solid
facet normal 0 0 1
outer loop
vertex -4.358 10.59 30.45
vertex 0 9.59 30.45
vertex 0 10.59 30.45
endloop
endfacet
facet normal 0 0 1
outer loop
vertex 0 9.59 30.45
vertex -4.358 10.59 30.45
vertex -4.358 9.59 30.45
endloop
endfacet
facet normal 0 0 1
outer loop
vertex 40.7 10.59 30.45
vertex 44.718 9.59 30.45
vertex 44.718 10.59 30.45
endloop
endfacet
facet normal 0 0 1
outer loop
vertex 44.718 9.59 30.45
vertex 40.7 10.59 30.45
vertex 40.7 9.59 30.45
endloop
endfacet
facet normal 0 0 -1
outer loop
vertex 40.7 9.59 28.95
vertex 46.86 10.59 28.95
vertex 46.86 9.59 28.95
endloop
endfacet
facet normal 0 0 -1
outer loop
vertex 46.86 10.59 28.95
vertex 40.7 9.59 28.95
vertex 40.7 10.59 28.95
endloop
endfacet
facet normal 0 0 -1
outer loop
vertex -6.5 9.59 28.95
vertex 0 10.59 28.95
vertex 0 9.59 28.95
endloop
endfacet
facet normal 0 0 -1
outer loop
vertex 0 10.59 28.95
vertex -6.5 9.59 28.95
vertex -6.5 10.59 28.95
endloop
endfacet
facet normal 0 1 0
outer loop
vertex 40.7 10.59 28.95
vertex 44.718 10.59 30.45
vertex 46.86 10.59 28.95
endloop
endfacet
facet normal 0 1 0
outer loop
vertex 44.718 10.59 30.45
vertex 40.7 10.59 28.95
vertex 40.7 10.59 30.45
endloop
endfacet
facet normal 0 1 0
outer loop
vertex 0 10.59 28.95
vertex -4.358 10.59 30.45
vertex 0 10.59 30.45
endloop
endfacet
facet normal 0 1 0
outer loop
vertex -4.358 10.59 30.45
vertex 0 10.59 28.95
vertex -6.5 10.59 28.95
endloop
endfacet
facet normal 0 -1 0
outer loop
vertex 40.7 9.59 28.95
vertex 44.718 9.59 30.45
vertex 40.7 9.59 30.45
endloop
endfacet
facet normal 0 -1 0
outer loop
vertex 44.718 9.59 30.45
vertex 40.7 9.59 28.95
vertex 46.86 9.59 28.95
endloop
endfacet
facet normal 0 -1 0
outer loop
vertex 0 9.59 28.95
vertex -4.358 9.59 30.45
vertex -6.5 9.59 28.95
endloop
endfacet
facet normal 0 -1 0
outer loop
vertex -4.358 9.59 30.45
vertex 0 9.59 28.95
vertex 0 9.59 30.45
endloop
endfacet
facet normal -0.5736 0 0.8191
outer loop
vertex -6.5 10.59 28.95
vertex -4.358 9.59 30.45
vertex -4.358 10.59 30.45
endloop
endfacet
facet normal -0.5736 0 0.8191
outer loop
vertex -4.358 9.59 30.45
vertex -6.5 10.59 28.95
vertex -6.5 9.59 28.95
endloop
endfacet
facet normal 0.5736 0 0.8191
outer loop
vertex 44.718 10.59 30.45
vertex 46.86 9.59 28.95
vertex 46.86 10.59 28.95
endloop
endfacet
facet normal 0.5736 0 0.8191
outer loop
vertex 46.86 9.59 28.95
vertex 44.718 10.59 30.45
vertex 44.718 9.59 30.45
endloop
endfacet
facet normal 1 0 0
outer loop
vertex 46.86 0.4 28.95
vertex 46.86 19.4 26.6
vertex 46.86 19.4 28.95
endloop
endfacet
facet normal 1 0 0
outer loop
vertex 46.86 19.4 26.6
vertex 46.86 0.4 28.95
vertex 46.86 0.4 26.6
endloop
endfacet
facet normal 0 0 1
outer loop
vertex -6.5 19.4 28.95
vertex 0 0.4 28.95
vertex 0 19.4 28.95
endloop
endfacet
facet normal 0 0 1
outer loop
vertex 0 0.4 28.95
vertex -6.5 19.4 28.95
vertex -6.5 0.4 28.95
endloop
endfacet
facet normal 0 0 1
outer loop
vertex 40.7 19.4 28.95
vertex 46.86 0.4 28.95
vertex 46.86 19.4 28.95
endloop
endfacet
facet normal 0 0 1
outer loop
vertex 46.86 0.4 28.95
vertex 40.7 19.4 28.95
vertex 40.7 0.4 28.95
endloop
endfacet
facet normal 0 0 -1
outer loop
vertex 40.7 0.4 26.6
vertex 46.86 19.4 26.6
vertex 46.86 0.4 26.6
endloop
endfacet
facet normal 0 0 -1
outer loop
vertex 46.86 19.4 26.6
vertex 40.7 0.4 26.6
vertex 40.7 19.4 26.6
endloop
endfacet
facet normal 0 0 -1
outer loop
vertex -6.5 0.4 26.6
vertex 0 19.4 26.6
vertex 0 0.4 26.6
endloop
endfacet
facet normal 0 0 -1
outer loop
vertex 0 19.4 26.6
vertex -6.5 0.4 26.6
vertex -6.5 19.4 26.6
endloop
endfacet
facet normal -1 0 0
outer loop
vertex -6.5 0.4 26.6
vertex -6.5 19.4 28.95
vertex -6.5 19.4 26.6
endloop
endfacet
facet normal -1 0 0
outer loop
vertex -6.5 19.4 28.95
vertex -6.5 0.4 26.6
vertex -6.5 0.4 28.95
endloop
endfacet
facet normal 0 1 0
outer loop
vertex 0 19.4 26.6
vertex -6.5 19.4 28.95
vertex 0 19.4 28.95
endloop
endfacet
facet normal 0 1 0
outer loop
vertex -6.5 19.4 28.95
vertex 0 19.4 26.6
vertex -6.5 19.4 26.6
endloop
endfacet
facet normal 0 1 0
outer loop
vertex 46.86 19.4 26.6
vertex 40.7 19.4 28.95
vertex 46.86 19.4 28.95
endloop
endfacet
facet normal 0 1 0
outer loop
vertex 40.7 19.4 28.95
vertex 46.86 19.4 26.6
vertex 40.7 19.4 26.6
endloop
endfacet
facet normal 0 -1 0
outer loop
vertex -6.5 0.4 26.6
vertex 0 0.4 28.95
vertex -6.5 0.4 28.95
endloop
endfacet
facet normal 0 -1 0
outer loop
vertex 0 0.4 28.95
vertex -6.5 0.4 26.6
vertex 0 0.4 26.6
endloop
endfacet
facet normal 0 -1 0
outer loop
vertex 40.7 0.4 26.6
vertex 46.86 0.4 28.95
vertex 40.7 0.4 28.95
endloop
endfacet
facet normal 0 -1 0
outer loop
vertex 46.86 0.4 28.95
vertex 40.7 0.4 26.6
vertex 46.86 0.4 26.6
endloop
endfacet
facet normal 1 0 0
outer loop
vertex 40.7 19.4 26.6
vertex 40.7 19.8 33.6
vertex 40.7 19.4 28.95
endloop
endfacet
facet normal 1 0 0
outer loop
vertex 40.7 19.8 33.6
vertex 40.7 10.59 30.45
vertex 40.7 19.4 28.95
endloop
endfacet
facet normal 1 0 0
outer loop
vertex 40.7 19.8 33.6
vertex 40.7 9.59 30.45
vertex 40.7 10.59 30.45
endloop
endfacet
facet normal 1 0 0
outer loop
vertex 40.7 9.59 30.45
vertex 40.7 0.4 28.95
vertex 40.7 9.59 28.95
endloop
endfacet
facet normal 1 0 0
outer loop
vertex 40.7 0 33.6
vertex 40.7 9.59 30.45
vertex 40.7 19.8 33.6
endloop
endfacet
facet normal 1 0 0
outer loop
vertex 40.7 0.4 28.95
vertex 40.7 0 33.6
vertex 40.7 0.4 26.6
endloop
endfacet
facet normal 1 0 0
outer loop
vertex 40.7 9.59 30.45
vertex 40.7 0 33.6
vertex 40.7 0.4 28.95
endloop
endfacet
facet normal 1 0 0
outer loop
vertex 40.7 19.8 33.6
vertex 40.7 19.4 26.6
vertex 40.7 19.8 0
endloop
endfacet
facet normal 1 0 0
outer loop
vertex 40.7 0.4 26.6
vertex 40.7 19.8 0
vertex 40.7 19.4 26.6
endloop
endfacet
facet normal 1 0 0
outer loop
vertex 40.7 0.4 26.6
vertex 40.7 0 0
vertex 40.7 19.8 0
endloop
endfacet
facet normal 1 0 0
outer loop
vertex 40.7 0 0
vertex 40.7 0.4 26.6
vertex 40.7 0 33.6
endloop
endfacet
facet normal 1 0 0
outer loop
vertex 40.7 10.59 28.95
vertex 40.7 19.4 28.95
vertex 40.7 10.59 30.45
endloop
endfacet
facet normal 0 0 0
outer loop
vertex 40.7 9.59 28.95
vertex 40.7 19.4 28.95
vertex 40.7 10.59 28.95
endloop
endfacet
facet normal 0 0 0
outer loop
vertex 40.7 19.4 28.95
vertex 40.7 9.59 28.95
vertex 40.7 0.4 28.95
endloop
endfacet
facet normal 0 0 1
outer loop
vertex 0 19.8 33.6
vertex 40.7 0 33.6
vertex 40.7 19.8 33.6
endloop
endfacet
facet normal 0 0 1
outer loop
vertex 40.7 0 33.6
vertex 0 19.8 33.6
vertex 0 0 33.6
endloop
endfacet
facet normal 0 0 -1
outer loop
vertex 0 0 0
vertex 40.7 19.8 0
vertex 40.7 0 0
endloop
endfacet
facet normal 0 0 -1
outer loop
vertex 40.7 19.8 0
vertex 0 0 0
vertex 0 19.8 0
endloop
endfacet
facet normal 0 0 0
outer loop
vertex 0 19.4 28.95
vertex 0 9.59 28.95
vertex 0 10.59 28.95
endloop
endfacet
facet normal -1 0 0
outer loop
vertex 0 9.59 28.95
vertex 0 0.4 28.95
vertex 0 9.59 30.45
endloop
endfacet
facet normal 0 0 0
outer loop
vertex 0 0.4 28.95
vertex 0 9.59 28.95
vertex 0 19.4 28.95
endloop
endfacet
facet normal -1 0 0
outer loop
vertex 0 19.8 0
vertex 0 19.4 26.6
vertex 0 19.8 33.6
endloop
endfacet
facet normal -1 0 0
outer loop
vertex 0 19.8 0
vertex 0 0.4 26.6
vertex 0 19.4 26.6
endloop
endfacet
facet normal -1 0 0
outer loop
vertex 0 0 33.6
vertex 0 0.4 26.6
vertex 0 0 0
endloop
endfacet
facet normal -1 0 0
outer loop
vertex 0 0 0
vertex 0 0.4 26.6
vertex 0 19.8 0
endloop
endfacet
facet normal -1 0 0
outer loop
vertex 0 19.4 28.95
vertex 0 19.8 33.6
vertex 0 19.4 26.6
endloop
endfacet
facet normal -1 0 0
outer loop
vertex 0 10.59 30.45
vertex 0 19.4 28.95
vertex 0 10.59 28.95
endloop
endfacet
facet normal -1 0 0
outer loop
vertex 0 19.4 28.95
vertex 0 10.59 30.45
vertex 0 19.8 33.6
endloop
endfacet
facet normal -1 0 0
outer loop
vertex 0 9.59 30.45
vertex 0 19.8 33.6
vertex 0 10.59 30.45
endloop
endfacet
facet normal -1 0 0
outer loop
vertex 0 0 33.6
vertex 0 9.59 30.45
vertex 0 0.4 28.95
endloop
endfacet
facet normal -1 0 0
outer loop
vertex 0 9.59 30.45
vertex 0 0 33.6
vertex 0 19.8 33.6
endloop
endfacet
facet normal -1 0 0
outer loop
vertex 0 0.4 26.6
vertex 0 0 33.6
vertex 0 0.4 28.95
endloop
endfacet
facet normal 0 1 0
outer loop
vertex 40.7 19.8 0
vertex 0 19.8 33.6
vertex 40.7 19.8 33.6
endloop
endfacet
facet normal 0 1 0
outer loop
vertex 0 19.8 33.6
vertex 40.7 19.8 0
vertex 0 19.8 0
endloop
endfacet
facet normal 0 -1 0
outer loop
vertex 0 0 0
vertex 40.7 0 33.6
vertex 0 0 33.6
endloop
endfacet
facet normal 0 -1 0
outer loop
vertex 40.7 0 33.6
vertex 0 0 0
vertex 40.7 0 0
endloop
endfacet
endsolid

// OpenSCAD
$fn=100;

module servoMotor(screwGuides = false)
{
    cube([40.7,19.8,33.6]);
    translate([-6.5,0.4,26.6])
    difference()
    {
        union()
        {
            cube([53.36,19,2.35]);
            translate([0,9.19,2.35])
            difference()
            {
                cube([53.36,1,1.5]);
                rotate([0,-35,0])
                translate([-1,-1,0])
                cube([10,3,10]);
                translate([53.36,0,0])
                rotate([0,35,0])
                translate([-9,-1,0])
                cube([10,3,10]);
            }
        }
        
    }
}

module motorBlock()
{
	translate([-7.45,-4.25,0])
	{
		color("white")
		motorBracket();
		translate([1.5,-6.7,0])
		motor();
	}
}

module motorBracket()
{
	difference()
	{
		union()
		{
			cube([15,17.3,11.5]);
			for(x=[-1.55,16.45])
			{
				difference()
				{
					translate([x,4.25,0])
					cylinder(r=4.25,h=3);
					translate([x,4.25,1])
					cylinder(r=2.05,h=6,center=true);
				}
			}
		}
		translate([1.45,-1,-1.45])
		cube([12.1,19,11.5]);
	}
	
}

module motor()
{
	color("silver")
	intersection()
	{
		translate([6,15,5])
		rotate([90,0,0])
		cylinder(r=6,h=15);
		cube([12,15,10]);
	}

	color("goldenrod")
	translate([0,15,0])
	cube([12,9,10]);
	
	color("silver")
	translate([6,24,5])
	difference()
	{
		rotate([-90,0,0])
		cylinder(r=1.5,h=9.27);
		translate([-1.5,-0.5,1])
		cube([3,10,1]);
	}
}

module arduino()
{
	color("darkturquoise")
	difference()
	{
		cube([53.3,68.6,1]);
		for(pos =[	[2.5,14,-0.5],
					[50.8,15.3,-0.5],
					[17.7,66.1,-0.5],
					[45.7,66.1,-0.5]])
		{
			translate(pos)
			cylinder(r=1.25,h=2);
		}
		translate([-1,65,-1])
		cube([14,4,3]);
		translate([51.3,65,-1])
		cube([3,4,3]);
		translate([13,65,-1])
		rotate([0,0,45])
		cube([5,5,3]);
		translate([51.3,65,-1])
		rotate([0,0,45])
		cube([5,5,3]);
	}
	color("silver")
	translate([9.6,-6.2,1.6])
	cube([12,15,10.9]);

	color("silver")
	translate([41.1,-1.8,1.6])
	cube([8.9,14,10.9]);
}

module raspberryPi()
{
	color("darkgreen")
	cube([56,85,1.6]);

	color("silver")
	translate([2,-1,1.6])
	cube([15.4,21.8,13]);

	color("silver")
	translate([37.2,-7.7,1.6])
	cube([13.25,17.2,15.3]);

	color("black")
	translate([44.6,14,1.6])
	{
		cube([11.4,12,10.2]);
		translate([11.4,6,3.35+3])
		rotate([0,90,0])
		cylinder(r=3.35,h=3.4);
	}

	color("silver")
	translate([-1.2,32.4,1.6])
	cube([11.4,15.1,6.15]);

	color("silver")
	translate([3.6,79.9,1.6])
	cube([7.6,5.6,2.4]);

	translate([43.9,34.4,1.6])
	{
		color("yellow")
		cube([10,9.8,13]);

		color("silver")
		translate([10,4.9,8.15])
		rotate([0,90,0])
		cylinder(r=4.15,h=8.9);
	}

	color("black")
	translate([49.5, 50.8,1.6])
	cube([5,33.2,1]);

	color("black")
	translate([16.7,66,-5])
	cube([27.8,19,5]);
}

servoMotor();
